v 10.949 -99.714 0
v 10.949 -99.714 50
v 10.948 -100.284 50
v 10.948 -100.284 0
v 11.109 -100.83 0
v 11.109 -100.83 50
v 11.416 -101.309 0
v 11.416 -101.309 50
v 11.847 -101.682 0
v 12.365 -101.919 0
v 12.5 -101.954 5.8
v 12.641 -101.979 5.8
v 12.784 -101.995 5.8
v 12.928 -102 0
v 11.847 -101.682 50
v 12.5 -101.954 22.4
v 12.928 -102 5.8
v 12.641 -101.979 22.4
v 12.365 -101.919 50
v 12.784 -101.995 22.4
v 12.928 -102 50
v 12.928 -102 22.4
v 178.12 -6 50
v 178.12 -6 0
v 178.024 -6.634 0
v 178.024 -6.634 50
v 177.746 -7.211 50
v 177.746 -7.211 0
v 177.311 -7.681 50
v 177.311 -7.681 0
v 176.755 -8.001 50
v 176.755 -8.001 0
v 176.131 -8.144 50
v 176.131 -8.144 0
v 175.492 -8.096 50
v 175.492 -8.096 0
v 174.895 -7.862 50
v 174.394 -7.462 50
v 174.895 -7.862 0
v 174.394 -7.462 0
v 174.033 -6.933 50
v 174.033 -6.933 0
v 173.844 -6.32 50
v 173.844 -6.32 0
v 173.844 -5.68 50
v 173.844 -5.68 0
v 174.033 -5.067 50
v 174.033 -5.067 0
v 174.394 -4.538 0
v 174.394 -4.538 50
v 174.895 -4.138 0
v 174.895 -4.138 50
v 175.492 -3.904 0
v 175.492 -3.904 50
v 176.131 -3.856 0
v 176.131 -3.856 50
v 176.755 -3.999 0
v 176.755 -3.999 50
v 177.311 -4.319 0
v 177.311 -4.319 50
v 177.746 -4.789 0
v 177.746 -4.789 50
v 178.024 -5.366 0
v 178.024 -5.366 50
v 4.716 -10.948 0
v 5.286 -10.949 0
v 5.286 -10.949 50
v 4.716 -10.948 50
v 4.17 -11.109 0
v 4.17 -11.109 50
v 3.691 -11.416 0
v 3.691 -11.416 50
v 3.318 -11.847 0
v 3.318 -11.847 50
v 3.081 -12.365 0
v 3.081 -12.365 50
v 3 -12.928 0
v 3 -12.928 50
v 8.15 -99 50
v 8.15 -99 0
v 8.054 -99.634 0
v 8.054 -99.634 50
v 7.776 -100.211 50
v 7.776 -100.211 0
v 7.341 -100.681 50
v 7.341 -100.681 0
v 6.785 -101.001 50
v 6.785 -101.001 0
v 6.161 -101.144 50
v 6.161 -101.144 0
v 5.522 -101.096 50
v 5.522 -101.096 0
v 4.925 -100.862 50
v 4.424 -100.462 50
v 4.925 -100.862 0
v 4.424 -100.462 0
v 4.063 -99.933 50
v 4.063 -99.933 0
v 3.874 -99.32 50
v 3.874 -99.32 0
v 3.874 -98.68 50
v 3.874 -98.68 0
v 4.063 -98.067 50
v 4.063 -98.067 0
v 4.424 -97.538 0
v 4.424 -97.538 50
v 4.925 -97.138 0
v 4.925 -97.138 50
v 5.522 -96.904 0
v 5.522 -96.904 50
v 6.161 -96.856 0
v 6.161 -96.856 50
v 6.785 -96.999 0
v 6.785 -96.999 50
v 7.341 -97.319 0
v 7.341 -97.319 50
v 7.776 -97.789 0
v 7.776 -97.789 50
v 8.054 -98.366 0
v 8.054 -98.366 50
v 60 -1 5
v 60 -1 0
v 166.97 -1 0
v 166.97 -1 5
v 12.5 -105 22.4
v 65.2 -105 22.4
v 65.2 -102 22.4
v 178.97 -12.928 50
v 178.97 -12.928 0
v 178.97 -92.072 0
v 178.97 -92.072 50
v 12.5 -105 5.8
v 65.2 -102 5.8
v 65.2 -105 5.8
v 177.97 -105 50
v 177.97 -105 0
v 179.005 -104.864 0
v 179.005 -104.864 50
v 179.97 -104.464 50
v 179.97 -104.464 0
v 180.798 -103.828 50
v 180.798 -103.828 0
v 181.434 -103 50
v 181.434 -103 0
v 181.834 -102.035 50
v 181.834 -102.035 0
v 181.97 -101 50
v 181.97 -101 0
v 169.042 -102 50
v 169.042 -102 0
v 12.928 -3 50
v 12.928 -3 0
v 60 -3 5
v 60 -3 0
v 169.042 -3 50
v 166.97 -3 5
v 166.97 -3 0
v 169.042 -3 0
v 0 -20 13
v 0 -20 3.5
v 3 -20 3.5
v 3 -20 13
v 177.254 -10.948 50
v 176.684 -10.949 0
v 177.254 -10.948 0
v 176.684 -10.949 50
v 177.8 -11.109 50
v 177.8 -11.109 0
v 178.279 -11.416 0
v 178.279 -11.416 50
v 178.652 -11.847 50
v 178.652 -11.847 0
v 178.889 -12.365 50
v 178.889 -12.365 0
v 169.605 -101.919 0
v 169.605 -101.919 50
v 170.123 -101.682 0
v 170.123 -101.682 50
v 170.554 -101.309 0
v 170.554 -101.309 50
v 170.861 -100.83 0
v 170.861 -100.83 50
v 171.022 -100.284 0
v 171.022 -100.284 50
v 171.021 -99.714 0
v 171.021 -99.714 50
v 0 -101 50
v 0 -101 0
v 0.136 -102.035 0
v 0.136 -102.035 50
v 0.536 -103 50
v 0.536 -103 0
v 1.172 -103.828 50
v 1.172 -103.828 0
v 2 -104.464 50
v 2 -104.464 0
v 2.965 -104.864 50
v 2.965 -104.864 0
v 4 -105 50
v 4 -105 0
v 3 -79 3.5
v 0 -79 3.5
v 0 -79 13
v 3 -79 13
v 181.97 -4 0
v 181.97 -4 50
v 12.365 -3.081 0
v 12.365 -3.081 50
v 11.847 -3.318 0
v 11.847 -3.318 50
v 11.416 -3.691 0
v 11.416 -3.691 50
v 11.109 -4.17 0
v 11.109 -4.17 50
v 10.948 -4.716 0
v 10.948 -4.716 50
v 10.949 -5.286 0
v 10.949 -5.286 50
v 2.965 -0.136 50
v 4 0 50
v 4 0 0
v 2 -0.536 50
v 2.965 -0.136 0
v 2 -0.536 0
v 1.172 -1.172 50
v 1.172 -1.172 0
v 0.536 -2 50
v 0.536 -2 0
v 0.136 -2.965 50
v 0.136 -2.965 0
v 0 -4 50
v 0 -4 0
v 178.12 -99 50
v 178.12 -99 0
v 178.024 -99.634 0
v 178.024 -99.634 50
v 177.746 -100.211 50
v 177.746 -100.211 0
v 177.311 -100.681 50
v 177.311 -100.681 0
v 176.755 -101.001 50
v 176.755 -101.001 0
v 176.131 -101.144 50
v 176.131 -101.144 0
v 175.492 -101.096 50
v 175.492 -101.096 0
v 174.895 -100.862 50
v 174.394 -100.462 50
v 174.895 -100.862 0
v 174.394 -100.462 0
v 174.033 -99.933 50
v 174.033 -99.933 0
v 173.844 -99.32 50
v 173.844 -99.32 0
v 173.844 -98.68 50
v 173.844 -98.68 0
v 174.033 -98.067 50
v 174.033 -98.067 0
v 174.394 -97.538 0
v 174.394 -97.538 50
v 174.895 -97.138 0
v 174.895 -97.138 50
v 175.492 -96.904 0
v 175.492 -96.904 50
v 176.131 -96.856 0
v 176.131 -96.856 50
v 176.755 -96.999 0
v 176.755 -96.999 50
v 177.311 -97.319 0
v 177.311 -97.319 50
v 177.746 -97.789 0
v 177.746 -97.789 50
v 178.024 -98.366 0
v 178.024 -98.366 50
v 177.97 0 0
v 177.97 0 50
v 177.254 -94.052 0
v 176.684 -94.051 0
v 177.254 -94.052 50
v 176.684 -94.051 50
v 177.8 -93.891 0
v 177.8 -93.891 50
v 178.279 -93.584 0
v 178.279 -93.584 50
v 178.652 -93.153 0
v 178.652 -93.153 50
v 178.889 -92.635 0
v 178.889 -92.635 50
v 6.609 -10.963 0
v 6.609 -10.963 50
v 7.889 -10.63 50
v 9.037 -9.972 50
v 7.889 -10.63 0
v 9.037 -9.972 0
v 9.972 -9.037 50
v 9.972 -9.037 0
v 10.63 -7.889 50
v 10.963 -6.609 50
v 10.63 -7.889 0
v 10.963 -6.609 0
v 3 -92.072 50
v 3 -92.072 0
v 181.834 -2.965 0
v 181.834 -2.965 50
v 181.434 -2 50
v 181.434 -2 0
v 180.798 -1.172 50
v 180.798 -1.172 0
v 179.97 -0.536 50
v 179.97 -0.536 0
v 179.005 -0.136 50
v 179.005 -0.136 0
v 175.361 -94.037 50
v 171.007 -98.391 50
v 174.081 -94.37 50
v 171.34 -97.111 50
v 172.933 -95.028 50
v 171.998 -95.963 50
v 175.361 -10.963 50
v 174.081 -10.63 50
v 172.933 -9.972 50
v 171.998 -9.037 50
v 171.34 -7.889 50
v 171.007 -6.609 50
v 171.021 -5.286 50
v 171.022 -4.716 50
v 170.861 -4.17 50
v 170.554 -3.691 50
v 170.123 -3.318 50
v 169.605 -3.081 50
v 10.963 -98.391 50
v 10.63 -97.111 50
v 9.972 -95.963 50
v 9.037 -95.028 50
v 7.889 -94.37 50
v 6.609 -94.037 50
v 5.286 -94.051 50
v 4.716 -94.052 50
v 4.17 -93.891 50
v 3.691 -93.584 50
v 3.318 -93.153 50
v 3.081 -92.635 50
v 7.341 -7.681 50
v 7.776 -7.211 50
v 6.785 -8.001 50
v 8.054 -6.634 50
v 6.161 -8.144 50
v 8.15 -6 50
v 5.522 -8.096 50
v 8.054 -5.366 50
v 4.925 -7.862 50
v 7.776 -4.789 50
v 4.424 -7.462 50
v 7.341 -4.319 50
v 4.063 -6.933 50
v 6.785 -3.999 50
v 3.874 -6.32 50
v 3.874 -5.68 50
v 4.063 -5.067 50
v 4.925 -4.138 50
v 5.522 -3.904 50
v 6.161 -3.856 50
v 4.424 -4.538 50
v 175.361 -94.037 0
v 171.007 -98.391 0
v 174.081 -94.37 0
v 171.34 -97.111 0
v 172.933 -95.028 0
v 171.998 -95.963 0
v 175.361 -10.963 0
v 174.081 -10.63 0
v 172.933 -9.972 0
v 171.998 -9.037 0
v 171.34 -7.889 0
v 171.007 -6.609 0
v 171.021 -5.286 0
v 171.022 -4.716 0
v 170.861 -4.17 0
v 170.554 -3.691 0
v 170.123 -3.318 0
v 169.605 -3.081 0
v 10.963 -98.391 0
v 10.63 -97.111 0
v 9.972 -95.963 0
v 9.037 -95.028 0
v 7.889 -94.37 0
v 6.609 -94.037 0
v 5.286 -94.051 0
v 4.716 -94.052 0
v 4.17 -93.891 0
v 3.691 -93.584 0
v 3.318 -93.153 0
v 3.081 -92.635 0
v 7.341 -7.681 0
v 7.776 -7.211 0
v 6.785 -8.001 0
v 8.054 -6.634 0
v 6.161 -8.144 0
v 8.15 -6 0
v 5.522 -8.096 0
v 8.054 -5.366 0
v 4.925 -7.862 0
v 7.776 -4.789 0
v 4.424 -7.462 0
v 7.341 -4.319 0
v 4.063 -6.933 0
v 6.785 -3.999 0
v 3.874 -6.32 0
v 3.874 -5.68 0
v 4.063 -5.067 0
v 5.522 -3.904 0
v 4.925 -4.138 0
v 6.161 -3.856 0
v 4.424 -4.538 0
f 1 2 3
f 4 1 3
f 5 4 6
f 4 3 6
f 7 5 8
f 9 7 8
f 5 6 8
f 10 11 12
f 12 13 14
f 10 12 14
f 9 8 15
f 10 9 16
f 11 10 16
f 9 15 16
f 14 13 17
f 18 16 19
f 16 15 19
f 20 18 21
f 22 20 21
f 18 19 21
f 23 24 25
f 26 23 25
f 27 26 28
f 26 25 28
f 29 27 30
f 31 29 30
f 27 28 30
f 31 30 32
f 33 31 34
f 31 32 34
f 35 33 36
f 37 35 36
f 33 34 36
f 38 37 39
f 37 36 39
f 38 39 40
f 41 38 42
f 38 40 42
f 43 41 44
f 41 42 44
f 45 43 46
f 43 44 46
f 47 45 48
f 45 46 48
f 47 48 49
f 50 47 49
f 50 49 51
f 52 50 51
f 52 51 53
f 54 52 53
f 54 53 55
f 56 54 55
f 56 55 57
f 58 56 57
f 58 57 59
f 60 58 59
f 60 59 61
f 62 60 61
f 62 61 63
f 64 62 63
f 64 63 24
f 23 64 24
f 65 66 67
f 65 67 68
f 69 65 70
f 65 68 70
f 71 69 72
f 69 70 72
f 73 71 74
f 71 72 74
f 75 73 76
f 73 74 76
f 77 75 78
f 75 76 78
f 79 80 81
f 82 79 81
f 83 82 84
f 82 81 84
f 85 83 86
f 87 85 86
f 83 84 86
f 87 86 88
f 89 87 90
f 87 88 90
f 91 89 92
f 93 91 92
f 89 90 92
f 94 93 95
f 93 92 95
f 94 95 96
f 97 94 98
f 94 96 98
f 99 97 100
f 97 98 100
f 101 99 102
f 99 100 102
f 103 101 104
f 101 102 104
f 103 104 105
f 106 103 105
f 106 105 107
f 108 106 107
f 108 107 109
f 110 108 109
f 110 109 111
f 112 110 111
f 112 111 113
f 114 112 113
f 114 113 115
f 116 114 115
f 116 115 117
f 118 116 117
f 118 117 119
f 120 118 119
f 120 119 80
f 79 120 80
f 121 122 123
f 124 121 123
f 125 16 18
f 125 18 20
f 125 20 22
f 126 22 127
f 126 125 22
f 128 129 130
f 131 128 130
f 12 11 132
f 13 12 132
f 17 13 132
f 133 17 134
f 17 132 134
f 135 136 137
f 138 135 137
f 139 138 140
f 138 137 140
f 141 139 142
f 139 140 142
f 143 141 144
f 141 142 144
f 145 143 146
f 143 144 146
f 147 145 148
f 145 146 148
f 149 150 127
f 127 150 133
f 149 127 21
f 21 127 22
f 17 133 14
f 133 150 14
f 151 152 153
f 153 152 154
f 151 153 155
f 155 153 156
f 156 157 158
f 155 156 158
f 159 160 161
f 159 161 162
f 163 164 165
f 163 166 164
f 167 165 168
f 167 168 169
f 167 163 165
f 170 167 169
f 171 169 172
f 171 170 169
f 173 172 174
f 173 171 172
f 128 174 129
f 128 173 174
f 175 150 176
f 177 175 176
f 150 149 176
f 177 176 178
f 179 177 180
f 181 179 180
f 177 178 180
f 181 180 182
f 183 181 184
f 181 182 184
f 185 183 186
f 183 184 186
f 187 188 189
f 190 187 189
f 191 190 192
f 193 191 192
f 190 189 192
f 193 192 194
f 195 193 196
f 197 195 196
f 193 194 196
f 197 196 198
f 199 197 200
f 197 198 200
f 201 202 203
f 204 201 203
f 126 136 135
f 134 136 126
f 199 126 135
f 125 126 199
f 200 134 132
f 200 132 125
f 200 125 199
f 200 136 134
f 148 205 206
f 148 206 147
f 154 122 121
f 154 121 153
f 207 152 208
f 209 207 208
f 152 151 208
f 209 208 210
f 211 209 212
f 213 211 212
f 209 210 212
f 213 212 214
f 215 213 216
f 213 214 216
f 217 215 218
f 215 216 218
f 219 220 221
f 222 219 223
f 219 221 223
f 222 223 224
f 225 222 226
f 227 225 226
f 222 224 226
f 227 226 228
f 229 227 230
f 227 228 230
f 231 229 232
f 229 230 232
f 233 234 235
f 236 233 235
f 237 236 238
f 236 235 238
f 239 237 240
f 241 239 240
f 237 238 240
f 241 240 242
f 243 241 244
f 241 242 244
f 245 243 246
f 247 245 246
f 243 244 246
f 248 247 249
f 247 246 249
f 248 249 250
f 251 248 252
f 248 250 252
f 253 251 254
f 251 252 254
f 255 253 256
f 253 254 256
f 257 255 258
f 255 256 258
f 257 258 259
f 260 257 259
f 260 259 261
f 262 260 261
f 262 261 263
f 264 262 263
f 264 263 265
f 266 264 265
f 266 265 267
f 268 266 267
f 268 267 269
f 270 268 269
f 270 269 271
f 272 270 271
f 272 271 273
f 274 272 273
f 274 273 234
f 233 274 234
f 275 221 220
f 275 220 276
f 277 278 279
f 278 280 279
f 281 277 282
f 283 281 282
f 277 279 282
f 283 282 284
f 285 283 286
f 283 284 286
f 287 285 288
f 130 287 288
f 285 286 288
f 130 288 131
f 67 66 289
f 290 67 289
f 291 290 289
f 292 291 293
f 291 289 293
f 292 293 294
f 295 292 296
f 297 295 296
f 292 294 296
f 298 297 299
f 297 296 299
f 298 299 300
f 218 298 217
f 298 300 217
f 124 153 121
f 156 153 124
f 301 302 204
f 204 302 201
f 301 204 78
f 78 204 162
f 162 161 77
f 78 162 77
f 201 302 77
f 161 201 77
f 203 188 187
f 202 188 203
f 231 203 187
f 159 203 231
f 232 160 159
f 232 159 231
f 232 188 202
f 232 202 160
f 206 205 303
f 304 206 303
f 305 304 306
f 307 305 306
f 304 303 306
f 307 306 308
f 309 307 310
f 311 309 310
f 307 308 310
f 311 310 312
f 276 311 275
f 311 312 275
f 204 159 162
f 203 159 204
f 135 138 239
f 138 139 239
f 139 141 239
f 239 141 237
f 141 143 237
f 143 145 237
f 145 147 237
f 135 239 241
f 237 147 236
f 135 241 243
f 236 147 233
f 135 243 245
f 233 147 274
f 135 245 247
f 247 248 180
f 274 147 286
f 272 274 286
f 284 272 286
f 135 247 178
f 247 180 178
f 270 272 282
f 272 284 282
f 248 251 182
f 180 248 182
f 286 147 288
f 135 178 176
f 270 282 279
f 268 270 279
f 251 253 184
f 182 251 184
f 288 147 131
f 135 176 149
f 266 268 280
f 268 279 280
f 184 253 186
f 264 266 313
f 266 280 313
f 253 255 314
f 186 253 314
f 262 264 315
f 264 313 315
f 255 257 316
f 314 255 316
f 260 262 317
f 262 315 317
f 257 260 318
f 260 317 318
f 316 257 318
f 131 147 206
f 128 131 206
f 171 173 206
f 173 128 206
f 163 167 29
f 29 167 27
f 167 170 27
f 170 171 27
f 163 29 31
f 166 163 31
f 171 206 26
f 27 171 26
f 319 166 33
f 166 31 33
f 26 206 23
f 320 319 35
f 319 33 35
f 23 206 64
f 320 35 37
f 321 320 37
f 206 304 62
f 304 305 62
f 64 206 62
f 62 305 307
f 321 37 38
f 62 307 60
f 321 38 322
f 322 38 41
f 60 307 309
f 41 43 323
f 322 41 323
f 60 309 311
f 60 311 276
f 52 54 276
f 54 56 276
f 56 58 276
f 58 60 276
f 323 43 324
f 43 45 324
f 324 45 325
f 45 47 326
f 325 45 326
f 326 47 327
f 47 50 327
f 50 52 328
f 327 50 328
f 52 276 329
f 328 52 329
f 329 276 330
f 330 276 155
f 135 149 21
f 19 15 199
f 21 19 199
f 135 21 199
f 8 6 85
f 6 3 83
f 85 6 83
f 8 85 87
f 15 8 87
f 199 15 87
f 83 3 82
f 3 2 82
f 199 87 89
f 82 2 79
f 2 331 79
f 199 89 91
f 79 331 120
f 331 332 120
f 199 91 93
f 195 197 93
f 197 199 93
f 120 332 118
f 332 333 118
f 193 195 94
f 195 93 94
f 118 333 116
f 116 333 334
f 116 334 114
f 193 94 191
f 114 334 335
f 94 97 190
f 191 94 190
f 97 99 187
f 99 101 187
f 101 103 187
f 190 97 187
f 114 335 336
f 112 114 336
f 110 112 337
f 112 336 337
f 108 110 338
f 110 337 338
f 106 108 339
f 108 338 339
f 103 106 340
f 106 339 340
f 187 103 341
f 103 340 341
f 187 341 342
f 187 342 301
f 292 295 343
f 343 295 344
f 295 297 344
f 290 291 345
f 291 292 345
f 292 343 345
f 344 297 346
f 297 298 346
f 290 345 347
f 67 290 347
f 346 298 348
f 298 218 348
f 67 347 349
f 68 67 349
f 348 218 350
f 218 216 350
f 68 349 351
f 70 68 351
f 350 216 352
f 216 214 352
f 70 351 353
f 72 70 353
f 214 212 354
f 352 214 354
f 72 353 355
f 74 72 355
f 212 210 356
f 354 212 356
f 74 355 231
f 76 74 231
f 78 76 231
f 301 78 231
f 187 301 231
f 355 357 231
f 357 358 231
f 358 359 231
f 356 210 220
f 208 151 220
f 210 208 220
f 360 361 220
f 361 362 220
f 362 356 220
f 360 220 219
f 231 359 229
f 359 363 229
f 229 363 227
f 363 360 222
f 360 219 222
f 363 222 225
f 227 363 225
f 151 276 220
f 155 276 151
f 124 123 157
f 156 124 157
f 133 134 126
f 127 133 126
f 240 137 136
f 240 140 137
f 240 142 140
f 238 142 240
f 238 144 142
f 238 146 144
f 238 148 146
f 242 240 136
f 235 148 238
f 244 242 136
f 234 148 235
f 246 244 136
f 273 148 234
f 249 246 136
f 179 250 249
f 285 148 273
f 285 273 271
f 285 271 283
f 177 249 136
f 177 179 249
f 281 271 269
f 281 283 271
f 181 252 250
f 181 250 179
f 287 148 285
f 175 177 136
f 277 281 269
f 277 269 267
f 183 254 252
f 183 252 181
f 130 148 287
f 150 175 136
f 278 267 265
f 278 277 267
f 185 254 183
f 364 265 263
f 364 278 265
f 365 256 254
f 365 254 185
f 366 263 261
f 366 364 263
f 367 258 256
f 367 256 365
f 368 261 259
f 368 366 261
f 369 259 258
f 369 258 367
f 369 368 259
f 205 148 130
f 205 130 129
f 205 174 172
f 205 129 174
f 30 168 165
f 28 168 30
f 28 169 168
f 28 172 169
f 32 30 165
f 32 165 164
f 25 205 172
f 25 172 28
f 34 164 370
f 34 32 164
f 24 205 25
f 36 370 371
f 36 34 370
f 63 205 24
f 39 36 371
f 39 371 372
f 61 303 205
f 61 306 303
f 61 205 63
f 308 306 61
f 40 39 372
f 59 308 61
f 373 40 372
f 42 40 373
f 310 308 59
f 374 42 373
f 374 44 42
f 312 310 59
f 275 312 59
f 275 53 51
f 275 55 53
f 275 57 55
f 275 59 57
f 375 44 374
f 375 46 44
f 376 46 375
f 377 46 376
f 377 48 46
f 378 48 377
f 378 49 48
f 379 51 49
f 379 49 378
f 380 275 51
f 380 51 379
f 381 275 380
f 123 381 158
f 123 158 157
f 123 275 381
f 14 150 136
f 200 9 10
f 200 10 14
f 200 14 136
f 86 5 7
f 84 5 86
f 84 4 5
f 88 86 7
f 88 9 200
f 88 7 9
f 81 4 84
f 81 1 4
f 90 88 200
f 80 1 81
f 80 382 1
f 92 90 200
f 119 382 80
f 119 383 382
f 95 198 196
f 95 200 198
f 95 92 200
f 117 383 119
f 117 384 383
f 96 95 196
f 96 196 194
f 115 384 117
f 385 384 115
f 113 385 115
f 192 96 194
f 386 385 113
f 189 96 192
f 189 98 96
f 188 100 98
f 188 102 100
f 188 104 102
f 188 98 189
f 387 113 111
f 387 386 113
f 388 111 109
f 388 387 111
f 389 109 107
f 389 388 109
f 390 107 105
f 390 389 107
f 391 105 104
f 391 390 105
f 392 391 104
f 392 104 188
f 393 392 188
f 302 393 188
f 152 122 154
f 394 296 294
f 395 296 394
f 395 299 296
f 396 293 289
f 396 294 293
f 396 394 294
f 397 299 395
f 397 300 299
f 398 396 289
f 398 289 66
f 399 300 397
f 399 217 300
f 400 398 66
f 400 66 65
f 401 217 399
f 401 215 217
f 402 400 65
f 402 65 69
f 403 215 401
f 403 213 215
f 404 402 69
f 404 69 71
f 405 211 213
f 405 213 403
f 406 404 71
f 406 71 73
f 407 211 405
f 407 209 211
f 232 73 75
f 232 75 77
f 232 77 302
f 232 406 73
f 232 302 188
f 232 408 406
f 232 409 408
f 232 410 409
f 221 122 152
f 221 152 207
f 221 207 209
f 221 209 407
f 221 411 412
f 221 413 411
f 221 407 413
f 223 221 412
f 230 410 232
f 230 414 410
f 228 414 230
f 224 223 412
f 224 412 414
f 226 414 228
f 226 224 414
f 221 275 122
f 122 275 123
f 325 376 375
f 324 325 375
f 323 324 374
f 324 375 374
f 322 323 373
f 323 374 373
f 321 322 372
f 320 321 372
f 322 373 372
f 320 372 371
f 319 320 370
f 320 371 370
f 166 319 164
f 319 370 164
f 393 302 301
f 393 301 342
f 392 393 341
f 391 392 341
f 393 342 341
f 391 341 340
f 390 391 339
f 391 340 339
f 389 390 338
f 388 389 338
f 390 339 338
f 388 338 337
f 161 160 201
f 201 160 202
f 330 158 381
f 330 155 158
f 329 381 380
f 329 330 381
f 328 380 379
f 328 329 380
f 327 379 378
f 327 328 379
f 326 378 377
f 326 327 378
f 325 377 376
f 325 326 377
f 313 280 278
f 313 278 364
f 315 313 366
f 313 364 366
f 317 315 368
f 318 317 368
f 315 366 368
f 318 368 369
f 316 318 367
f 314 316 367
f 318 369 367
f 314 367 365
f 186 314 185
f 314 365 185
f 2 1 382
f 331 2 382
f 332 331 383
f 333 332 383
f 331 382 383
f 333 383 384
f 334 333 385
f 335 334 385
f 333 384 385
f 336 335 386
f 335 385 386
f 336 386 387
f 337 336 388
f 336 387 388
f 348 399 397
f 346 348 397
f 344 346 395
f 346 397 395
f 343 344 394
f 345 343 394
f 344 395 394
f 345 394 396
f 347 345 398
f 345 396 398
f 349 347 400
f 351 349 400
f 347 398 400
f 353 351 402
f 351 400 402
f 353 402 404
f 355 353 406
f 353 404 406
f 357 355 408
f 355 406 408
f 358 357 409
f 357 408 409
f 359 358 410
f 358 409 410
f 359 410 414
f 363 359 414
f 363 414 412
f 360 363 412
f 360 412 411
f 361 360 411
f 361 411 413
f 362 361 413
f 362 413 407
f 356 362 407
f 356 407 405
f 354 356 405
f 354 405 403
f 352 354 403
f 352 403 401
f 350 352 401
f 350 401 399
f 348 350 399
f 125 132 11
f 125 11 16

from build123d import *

# Parameters (mm, degrees)
PAD003_DEPTH    = 50
SKETCH006_W     = 106.97
SKETCH006_H     = 2
POCKET002_DEPTH = 5
SKETCH007_R     = 2.15
POCKET003_DEPTH = 50.001
FILLET001_R     = 2
SKETCH008_W     = 52.7
SKETCH008_H     = 16.6
POCKET004_DEPTH = 5
SKETCH009_W     = 59
SKETCH009_H     = 9.5
POCKET005_DEPTH = 5


with BuildPart() as part:
    # Sketch005 → Pad003 (new body)
    with BuildSketch(Plane.XY):
        with BuildLine():
            Line((4, 0), (177.97, 0))
            ThreePointArc((181.97, -4), (180.798427, -1.171573), (177.97, 0))
            Line((181.97, -4), (181.97, -101))
            ThreePointArc((177.97, -105), (180.798427, -103.828427), (181.97, -101))
            Line((177.97, -105), (4, -105))
            ThreePointArc((0, -101), (1.171573, -103.828427), (4, -105))
            Line((0, -101), (0, -4))
            ThreePointArc((4, 0), (1.171573, -1.171573), (0, -4))
        make_face()
        with BuildLine():
            Line((10, -3), (171.97, -3))
            ThreePointArc((171.97, -3), (172.434466, -9.535534), (178.97, -10))
            Line((178.97, -10), (178.97, -95))
            ThreePointArc((178.97, -95), (172.434466, -95.464466), (171.97, -102))
            Line((171.97, -102), (10, -102))
            ThreePointArc((10, -102), (9.535534, -95.464466), (3, -95))
            Line((3, -95), (3, -10))
            ThreePointArc((3, -10), (9.535534, -9.535534), (10, -3))
        make_face(mode=Mode.SUBTRACT)
    extrude(amount=PAD003_DEPTH)

    # Sketch006 (on Face17 of Pad003) → Pocket002 (cut)
    with BuildSketch(Plane(origin=(0, 0, 0), x_dir=(1, 0, 0), z_dir=(0, 0, -1))):
        with Locations((113.485, 2)):
            Rectangle(SKETCH006_W, SKETCH006_H)
    extrude(amount=-POCKET002_DEPTH, mode=Mode.SUBTRACT)

    # Sketch007 (on Face4 of Pocket002) → Pocket003 (cut, through all)
    with BuildSketch(Plane(origin=(0, 0, 0), x_dir=(1, 0, 0), z_dir=(0, 0, -1))):
        with Locations((6, 99)):
            Circle(SKETCH007_R)
        with Locations((175.97, 99)):
            Circle(SKETCH007_R)
        with Locations((6, 6)):
            Circle(SKETCH007_R)
        with Locations((175.97, 6)):
            Circle(SKETCH007_R)
    extrude(amount=-POCKET003_DEPTH, mode=Mode.SUBTRACT)

    # Fillet001
    fillet001_edges = [part.edges().sort_by_distance(p)[0] for p in [
        (3, -95, 25),
        (10, -102, 25),
        (3, -10, 25),
        (10, -3, 25),
        (171.97, -102, 25),
        (178.97, -95, 25),
        (178.97, -10, 25),
        (171.97, -3, 25),
    ]]
    fillet(fillet001_edges, radius=FILLET001_R)

    # Sketch008 (on Face24 of Fillet001) → Pocket004 (cut)
    with BuildSketch(Plane.XZ.offset(105)):
        with Locations((38.85, 14.1)):
            Rectangle(SKETCH008_W, SKETCH008_H)
    extrude(amount=-POCKET004_DEPTH, mode=Mode.SUBTRACT)

    # Sketch009 (on Face21 of Pocket004) → Pocket005 (cut)
    with BuildSketch(Plane(origin=(0, 0, 0), x_dir=(0, -1, 0), z_dir=(-1, 0, 0))):
        with Locations((49.5, 8.25)):
            Rectangle(SKETCH009_W, SKETCH009_H)
    extrude(amount=-POCKET005_DEPTH, mode=Mode.SUBTRACT)


solid = part.part
